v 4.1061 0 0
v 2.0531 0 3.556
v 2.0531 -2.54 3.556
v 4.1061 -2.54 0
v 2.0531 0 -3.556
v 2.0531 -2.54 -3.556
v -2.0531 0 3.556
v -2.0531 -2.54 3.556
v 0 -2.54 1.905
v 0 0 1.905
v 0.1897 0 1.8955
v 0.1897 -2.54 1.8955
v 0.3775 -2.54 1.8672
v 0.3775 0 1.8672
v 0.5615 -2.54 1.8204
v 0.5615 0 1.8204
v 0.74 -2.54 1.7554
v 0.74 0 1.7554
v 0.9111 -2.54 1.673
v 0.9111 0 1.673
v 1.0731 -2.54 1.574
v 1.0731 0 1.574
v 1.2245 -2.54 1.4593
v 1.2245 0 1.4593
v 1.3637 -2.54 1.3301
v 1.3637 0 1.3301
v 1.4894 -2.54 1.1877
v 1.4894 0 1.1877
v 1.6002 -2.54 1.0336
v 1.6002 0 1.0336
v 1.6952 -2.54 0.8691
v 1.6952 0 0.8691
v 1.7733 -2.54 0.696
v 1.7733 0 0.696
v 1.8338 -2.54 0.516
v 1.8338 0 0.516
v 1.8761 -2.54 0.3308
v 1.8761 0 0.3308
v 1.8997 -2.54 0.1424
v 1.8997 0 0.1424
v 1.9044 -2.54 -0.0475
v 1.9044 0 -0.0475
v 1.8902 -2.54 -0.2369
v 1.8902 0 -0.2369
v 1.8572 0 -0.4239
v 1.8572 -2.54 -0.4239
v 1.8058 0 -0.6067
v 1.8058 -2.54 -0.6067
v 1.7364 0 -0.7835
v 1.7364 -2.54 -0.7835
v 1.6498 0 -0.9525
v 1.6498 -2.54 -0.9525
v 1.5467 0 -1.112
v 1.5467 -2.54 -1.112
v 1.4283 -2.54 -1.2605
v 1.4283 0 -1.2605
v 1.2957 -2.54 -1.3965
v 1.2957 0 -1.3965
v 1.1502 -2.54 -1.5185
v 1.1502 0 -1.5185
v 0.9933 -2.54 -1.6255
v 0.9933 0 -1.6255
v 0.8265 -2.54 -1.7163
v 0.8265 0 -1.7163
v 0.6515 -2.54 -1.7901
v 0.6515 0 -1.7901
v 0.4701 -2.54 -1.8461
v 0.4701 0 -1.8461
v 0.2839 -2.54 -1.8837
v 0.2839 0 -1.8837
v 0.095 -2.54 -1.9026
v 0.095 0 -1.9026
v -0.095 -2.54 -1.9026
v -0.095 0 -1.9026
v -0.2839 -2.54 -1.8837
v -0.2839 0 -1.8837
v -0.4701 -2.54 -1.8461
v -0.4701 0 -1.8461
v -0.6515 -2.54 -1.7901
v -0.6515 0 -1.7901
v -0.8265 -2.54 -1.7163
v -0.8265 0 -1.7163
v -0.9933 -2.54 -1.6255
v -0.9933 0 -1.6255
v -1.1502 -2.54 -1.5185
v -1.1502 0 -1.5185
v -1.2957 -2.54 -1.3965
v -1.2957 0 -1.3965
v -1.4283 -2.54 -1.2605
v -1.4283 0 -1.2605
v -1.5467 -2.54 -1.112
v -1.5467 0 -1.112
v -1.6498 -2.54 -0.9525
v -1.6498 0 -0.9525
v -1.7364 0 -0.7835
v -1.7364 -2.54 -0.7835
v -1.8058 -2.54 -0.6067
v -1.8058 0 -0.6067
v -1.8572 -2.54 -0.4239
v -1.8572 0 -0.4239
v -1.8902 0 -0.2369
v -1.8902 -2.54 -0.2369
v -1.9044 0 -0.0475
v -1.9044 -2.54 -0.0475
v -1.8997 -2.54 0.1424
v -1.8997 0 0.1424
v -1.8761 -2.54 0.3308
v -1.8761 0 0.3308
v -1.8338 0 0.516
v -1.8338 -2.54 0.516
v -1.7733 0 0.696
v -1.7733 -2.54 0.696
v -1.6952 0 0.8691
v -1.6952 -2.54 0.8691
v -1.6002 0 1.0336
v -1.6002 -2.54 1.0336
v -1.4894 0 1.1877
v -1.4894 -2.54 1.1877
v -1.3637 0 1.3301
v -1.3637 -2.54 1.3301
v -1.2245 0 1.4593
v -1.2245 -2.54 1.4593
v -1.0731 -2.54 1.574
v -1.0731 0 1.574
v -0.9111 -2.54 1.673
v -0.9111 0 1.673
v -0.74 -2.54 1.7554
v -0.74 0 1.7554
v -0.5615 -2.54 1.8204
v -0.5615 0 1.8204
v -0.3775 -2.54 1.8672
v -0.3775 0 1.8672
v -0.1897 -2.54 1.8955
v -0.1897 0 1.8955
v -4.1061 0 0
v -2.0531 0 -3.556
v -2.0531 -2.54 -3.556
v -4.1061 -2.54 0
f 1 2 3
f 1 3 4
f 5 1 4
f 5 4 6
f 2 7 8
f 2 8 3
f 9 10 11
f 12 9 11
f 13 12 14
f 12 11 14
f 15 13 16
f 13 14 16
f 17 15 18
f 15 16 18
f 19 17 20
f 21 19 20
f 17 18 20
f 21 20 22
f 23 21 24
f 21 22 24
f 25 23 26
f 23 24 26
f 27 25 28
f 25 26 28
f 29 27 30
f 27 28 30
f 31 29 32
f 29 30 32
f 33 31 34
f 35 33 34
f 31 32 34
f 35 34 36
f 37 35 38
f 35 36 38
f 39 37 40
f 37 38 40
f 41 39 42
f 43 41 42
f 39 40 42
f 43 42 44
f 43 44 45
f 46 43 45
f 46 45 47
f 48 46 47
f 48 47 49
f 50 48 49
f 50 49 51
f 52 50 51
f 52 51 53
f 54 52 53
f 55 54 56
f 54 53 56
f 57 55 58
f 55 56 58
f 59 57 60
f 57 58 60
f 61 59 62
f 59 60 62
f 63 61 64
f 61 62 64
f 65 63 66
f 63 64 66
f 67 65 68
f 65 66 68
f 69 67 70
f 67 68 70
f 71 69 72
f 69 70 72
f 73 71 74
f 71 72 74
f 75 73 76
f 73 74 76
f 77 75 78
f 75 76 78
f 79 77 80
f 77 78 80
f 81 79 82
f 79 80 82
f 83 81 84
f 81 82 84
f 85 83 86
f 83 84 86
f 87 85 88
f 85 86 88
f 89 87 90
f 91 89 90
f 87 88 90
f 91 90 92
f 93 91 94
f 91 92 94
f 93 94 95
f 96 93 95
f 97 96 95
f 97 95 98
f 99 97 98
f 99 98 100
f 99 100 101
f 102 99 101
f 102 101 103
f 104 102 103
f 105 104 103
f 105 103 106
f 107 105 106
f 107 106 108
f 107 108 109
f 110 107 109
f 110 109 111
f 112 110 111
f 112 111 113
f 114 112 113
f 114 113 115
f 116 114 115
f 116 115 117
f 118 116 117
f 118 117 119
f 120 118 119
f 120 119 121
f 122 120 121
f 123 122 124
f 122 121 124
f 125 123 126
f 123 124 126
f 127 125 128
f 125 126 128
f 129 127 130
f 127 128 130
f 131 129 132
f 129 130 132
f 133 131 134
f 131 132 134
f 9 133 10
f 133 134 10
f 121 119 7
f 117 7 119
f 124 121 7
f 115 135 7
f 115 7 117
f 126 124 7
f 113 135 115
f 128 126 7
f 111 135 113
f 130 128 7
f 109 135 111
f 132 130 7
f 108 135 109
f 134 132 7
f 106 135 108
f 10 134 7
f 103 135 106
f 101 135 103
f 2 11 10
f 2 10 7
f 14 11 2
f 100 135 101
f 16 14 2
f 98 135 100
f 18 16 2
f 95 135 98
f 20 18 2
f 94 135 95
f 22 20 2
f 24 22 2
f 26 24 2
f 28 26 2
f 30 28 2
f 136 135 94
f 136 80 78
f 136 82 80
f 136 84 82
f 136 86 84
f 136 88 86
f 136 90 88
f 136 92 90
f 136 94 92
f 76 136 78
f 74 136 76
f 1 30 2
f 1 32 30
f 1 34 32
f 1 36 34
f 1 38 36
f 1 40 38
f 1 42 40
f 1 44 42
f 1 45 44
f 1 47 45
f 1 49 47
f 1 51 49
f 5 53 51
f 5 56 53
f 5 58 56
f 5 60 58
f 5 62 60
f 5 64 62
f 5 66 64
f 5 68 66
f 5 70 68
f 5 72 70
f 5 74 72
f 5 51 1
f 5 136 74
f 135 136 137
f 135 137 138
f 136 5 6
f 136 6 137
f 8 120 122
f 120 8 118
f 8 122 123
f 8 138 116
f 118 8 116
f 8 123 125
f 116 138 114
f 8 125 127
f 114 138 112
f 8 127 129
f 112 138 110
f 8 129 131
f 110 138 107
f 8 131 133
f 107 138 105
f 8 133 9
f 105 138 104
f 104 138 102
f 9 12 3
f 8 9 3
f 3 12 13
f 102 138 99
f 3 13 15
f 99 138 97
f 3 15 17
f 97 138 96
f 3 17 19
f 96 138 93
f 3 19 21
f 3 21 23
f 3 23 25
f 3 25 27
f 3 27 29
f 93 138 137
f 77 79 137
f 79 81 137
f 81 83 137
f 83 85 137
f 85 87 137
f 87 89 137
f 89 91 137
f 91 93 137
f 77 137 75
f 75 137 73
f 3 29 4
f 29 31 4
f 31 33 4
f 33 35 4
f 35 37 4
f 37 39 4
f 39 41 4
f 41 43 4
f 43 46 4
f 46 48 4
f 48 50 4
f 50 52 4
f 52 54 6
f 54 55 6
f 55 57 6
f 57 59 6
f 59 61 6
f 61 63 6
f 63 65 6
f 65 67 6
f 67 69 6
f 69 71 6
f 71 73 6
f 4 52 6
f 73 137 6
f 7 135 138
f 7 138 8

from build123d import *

# Parameters (mm, degrees)
SKETCH1_R           = 1.905
BOSS_EXTRUDE1_DEPTH = 2.54


with BuildPart() as part:
    # Sketch1 → Boss-Extrude1 (new body)
    with BuildSketch(Plane(origin=(0, 0, 0), x_dir=(1, 0, 0), z_dir=(0, 1, 0))):
        Polygon((2.053057557, 3.556), (-2.053057557, 3.556), (-4.106115114, 0), (-2.053057557, -3.556), (2.053057557, -3.556), (4.106115114, 0), align=None)
        with Locations(Location((0, 0, 0), (0, 0, 270))):
            Circle(SKETCH1_R, mode=Mode.SUBTRACT)
    extrude(amount=-BOSS_EXTRUDE1_DEPTH)


solid = part.part
